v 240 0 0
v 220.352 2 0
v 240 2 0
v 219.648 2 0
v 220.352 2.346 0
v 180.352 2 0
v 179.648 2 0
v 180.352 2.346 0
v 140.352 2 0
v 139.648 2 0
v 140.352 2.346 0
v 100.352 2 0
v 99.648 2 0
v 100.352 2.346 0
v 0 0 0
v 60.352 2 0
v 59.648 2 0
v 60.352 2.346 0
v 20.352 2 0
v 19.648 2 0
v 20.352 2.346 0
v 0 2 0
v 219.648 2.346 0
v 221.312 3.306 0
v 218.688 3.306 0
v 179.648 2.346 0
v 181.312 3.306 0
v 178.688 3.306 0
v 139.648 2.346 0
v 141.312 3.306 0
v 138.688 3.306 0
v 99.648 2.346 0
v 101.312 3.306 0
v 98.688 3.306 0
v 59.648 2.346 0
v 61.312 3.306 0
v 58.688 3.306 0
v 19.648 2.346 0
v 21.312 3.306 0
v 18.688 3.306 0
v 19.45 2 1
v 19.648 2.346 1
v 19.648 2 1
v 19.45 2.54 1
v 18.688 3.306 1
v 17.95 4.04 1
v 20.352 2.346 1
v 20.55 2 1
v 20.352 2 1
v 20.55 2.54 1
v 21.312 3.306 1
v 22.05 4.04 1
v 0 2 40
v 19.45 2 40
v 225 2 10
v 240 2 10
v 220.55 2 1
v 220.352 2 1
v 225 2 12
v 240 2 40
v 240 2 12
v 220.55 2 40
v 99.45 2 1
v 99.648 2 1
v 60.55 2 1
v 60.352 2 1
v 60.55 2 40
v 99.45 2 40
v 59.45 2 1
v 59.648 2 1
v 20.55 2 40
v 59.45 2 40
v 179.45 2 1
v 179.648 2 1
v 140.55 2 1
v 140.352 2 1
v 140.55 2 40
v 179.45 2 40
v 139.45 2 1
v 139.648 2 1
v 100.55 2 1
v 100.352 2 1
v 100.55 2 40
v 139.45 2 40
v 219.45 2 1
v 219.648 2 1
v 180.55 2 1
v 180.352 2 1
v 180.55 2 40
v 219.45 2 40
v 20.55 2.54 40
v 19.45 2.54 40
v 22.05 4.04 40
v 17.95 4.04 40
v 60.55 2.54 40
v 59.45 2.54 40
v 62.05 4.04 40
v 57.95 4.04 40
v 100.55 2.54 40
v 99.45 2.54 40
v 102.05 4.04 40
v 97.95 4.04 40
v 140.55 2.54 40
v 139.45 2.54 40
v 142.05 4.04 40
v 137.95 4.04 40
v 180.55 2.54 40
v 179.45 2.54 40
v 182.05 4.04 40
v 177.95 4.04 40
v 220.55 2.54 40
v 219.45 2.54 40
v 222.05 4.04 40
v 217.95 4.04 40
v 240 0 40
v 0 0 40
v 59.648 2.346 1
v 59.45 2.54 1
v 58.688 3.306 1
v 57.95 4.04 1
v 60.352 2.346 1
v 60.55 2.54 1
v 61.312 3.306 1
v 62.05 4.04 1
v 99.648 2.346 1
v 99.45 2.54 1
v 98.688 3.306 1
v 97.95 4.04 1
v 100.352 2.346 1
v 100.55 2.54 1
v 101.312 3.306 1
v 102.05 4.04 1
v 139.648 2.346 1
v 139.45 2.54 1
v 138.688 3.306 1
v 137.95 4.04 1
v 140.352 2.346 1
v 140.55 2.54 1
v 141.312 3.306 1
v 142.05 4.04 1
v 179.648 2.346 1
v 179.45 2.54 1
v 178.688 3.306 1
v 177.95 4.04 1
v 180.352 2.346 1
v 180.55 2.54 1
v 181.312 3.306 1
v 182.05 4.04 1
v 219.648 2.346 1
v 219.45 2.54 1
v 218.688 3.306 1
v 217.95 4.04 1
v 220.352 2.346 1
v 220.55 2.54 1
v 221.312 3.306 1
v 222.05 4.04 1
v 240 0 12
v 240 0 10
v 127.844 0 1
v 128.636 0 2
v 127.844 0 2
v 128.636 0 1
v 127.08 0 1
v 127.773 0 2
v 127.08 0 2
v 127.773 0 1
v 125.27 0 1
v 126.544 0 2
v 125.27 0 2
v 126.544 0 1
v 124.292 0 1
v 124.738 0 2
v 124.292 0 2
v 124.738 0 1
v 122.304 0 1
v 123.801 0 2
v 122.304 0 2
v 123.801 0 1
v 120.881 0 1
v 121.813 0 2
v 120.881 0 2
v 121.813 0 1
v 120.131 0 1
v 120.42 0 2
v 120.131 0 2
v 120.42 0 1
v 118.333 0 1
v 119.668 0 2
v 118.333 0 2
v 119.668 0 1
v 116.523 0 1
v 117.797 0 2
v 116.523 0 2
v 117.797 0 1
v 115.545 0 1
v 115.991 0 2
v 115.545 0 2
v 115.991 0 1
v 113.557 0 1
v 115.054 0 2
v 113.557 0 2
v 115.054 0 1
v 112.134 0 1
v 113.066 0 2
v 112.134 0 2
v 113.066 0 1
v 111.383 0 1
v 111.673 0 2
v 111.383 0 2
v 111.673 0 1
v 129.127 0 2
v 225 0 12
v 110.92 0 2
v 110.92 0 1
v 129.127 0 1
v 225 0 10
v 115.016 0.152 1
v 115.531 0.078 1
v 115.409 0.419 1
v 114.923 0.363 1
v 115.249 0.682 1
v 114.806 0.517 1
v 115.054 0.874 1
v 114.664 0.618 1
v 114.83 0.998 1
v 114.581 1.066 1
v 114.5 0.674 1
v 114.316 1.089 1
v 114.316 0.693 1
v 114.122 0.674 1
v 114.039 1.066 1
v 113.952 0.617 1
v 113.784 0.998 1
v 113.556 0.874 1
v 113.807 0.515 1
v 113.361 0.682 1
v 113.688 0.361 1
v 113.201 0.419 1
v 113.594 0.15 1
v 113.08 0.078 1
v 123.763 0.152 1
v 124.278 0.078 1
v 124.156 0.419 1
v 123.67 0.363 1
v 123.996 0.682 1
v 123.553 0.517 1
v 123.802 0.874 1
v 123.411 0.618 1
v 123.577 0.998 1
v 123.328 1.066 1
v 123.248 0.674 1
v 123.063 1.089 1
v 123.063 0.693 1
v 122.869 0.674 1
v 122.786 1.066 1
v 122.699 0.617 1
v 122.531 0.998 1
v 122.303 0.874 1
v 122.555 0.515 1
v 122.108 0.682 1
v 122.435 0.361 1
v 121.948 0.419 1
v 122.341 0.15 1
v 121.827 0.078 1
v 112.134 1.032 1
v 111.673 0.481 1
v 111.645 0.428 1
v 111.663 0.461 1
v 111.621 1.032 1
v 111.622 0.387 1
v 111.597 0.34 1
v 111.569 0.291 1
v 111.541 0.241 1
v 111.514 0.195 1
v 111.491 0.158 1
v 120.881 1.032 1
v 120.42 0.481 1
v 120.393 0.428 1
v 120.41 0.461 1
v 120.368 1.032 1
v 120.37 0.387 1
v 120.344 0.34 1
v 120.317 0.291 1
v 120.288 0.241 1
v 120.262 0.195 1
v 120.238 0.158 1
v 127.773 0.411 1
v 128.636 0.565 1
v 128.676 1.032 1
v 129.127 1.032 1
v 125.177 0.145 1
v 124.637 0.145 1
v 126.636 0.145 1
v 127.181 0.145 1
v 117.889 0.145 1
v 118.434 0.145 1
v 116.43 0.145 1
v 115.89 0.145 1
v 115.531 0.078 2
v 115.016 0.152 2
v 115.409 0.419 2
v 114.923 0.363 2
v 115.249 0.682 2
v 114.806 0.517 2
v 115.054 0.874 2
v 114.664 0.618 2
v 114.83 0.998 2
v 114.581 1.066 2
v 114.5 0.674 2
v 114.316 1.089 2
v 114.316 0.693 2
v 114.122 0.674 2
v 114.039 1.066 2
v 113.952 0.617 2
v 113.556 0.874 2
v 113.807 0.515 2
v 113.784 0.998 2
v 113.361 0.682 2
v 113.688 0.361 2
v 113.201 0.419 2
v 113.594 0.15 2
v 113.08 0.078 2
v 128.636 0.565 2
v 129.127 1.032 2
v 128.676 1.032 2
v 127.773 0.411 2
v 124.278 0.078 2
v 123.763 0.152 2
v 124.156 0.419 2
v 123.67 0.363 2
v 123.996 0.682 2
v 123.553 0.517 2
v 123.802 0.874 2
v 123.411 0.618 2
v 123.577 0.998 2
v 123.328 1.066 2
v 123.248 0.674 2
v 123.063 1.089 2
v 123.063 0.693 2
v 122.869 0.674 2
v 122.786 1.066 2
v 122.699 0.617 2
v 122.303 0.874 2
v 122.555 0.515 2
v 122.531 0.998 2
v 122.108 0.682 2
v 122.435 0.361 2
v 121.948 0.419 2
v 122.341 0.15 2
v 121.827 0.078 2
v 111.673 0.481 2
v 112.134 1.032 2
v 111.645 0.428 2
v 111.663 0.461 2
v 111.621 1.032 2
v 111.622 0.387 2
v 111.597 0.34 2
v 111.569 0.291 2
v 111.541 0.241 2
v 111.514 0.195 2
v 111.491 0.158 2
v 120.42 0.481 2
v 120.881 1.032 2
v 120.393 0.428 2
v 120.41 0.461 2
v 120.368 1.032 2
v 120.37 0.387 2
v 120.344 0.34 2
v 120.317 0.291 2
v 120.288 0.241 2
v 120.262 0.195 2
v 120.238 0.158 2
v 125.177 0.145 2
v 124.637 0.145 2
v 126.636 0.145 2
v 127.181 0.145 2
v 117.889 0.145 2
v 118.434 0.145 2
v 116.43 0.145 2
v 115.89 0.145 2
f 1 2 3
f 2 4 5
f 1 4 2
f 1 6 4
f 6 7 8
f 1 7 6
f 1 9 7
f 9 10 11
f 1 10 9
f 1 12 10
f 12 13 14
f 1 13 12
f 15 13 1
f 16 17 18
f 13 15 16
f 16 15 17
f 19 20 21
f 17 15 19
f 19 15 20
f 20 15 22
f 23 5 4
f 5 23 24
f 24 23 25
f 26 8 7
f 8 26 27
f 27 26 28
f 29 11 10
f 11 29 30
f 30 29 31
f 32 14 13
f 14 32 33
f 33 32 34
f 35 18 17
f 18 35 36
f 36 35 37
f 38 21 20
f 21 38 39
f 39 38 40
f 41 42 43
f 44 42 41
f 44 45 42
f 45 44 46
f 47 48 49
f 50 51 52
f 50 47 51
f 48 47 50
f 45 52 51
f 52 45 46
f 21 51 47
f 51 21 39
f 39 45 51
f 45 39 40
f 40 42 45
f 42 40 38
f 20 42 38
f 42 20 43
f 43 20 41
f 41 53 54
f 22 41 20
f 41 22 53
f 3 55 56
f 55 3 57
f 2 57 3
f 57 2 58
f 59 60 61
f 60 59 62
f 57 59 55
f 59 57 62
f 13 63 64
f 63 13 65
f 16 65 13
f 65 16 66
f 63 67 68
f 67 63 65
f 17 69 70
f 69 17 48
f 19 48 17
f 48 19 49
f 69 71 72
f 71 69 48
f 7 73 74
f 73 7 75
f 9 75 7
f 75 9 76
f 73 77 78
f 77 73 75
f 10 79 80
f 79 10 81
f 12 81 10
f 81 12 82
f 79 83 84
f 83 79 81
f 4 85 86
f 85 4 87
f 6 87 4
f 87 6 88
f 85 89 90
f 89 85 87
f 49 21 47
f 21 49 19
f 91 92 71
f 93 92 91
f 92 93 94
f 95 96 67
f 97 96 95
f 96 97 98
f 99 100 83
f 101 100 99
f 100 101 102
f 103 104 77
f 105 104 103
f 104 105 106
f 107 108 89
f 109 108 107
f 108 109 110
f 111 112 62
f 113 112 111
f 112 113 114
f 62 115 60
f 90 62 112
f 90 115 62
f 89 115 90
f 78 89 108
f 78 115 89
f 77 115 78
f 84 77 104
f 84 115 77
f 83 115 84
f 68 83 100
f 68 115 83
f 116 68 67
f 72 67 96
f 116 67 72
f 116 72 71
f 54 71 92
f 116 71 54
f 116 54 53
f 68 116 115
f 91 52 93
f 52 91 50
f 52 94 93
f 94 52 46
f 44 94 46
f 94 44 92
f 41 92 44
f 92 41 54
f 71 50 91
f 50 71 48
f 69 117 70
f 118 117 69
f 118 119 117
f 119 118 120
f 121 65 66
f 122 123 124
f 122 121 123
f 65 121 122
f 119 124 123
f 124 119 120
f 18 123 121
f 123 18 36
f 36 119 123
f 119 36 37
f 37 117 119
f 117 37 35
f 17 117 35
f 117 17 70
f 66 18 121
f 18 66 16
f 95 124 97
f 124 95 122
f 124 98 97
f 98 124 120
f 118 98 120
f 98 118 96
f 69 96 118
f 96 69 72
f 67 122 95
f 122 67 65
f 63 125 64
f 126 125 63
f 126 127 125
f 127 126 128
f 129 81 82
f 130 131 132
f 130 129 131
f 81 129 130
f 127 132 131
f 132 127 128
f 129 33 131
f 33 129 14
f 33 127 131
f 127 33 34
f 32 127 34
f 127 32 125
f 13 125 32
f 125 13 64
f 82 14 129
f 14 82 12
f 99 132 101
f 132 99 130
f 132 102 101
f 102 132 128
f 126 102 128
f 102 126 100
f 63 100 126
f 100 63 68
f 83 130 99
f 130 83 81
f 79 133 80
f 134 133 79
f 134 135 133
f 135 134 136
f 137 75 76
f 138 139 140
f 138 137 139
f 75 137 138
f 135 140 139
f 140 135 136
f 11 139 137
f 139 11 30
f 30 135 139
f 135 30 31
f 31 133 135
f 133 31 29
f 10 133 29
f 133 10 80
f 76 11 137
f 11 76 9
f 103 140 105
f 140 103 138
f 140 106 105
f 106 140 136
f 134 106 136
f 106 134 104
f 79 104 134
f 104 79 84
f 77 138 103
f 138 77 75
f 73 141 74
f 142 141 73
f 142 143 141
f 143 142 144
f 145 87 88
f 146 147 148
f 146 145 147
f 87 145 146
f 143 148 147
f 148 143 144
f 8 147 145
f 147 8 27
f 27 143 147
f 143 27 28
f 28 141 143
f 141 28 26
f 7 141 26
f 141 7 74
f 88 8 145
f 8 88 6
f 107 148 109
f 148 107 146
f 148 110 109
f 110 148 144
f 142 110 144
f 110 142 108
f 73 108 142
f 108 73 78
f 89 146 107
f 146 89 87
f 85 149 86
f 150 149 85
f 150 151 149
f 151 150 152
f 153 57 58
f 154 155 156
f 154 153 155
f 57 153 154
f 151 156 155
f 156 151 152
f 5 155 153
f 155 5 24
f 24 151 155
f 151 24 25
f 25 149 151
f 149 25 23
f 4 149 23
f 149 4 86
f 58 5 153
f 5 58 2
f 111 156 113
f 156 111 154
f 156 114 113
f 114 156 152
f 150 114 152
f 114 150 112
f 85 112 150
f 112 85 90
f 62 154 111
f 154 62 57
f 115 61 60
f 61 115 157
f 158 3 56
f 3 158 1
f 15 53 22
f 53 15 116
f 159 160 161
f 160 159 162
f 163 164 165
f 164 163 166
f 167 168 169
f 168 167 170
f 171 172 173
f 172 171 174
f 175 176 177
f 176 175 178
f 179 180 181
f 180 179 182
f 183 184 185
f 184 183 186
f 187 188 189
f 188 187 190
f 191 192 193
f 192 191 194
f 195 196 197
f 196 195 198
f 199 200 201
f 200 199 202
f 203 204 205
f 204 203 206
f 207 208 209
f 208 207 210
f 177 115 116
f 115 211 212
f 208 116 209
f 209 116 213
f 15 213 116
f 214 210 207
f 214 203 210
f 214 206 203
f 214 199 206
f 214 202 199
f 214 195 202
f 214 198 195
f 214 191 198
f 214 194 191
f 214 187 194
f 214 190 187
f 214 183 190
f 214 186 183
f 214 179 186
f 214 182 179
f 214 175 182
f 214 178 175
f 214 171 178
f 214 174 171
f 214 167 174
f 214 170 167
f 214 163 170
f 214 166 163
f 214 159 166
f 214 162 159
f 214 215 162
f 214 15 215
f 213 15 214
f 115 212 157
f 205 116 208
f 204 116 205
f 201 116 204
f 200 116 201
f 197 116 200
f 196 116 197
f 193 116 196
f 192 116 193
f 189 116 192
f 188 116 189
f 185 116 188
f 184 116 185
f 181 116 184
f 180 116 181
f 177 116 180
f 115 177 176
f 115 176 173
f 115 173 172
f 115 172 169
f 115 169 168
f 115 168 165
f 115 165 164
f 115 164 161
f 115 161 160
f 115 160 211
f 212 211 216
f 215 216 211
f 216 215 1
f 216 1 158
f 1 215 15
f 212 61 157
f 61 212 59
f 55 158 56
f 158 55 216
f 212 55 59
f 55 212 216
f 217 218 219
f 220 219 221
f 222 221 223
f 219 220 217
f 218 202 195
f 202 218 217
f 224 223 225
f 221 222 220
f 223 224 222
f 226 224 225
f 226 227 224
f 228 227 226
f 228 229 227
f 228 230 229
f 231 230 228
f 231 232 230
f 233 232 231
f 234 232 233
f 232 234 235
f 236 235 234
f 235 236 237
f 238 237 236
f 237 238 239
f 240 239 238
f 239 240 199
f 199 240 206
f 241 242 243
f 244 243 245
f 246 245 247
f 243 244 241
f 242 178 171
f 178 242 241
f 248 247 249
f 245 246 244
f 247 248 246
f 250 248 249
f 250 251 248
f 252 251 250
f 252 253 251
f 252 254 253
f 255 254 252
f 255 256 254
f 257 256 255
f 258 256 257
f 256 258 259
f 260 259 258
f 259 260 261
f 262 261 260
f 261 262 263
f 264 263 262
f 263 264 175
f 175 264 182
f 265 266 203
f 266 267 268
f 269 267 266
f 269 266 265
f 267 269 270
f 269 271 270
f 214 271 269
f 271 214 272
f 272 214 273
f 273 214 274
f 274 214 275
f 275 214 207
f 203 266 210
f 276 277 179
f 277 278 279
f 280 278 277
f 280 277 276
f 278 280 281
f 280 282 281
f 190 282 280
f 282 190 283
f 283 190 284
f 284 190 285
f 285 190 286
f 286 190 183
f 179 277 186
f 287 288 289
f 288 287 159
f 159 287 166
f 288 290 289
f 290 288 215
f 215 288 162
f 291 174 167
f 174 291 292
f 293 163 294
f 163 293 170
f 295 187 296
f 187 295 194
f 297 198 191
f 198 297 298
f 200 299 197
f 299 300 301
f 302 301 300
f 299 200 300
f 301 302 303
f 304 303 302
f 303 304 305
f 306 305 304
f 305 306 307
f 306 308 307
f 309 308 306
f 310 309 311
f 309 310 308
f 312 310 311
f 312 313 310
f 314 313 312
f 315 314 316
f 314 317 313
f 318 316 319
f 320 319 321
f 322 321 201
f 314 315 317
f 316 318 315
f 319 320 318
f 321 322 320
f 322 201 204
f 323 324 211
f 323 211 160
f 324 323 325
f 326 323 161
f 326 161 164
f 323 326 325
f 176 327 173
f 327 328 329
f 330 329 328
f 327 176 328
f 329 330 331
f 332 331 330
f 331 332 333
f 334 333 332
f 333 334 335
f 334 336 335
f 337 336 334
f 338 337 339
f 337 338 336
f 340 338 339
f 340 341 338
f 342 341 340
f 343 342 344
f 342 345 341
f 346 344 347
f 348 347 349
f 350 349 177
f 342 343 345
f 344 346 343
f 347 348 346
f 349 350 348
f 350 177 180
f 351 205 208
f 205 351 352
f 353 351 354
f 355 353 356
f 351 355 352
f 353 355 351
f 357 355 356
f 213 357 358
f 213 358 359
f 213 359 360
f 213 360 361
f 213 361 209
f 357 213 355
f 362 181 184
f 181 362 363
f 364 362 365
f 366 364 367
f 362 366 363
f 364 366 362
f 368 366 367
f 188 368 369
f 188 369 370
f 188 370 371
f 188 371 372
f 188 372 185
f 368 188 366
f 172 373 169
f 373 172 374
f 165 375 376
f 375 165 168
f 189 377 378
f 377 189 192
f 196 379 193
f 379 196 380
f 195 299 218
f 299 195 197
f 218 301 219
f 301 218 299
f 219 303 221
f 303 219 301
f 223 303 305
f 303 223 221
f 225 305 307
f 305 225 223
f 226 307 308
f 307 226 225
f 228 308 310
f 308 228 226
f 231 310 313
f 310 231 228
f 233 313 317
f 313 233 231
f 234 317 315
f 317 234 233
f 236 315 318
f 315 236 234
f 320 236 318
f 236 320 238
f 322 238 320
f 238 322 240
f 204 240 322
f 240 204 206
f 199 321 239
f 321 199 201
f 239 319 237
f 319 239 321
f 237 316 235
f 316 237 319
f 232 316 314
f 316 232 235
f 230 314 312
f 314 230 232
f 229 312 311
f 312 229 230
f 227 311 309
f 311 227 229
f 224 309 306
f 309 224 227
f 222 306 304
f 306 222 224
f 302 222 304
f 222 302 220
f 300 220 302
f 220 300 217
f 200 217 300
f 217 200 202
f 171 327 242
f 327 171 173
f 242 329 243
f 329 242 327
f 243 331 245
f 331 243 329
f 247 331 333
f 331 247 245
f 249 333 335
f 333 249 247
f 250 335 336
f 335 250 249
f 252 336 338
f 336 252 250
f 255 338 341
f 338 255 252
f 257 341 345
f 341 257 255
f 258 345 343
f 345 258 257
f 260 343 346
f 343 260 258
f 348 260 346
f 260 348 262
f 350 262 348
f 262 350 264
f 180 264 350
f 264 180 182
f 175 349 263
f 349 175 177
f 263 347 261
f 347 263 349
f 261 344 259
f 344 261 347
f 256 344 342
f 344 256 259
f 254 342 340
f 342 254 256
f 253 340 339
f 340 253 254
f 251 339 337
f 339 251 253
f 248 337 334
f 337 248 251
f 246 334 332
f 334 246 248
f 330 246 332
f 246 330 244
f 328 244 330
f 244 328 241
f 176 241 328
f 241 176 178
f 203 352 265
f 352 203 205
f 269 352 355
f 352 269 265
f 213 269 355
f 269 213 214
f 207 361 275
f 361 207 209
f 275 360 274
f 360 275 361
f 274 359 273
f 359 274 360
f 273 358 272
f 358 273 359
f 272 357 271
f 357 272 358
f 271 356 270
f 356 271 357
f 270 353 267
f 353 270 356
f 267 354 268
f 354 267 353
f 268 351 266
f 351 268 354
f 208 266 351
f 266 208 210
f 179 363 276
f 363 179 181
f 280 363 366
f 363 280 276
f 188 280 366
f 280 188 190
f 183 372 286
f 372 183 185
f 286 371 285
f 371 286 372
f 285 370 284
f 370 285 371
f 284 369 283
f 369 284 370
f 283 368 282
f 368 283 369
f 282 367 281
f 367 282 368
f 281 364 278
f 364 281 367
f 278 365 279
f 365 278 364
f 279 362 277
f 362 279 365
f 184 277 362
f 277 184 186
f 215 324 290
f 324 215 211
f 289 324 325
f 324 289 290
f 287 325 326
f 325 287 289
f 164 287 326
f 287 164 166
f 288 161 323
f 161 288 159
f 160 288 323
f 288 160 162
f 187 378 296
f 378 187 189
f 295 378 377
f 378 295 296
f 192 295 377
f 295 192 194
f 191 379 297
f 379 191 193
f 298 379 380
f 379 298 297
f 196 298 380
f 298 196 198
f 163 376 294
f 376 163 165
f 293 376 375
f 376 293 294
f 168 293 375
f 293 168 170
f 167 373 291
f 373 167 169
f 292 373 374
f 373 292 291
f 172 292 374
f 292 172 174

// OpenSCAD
echo(version=version(4.0));
//comments: Version 2 adds anti-"elephant foot" scaling at bottom of dovetail sections
//comments: Version 3 added rounded bottom, dovetail suppression, and ability to render a 0 box units width
//comments: Version 4 added notation to the bottom that records dovetail size and box size
//comments: Version 5 added card slot feature for inserting labels or cards
/* [Size] */
//Box unit size in mm. This defines the size of 1 'unit' for your box.
BoxUnits = 40;
//Box Height in mm
BoxHeight = 40;
//Box Wall Thickness in mm
BoxWall = 1;
//Box Floor Thickness in mm
BoxFloor = 2;
//Box Width in units
BoxWidthUnits = 0;
BoxWidth = (BoxWidthUnits>0) ? BoxWidthUnits * BoxUnits : BoxWall*2;


//Box Length in units
BoxLengthUnits = 6;
BoxLength = BoxLengthUnits * BoxUnits;


//Fit Factor. Greater factor = looser fit
FitFactor = 0.18;  // [0:0.01:0.4]
RoundedBottom = "EW"; // [N:None, EW:East-West, NS:North-South]

/* [Walls] */
//North Wall open or closed
NorthWallOpen = 0; // [0:Closed, 1:Open]
//South Wall open or closed
SouthWallOpen = 0; // [0:Closed, 1:Open]

/* [Dovetail] */
//Set True to suppress female dovetails
SuppressFemaleDT = 1; // [1:True, 0:False]
//Set True to suppress male dovetails
SuppressMaleDT = 0; // [1:True, 0:False]
//Dovetail inside length in mm
DTInsideLength = 1.1;
//Dovetail angle in degrees
DTAngle = 45;
//Dovetail width in mm
DTWidth = 1.5;

/* [Card Slot] */
//Enable card slot for label or identification
EnableCardSlot = true; // [true:Enabled, false:Disabled]
//Width of the card to insert (mm)
CardWidth = 30;
//Height of the card slot (mm)
CardSlotHeight = 2;
//Depth of the card slot (how far it extends into the box) (mm)
CardSlotDepth = 15;
//Clearance for the card (makes the slot slightly larger) (mm)
CardClearance = 0.5;
//Vertical position of the card slot from bottom (mm)
CardSlotYPos = 10;
//Which side to place the card slot (0=None, 1=South, 2=North, 3=Both)
CardSlotSide = 1; // [0:None, 1:South, 2:North, 3:Both]

/* [Hidden] */
//This helps calculate the length of the 'long' side of the dovetail
DTx=tan(DTAngle)*DTWidth;
//This polygon defines the dovetail shape
DTShape = [[0,0],[DTInsideLength/2,0],[DTInsideLength/2+DTx,DTWidth],[-DTInsideLength/2-DTx,DTWidth],[-DTInsideLength/2,0]];

// Small value for ensuring proper differences and unions
epsilon = 0.01;

//build text for bottom
DTTxt=str("DT:",DTWidth,"x",DTInsideLength);
SizeTxt=str(BoxUnits,"x",BoxHeight,"x",BoxWall);

//this section defines a module for creating a "rounded" bottom to the box, useful when storing small parts
module RoundBottom(width, length, height){    
    translate([0,length,0])rotate([90,0,0])
    linear_extrude(length, center=false)
    
    difference() {
        translate([-width/2,0,0])square([width,height/2],center=false);
        translate([0,height/2,0])resize([width,height]) circle(d=width*10);
    }
}



union(){
    //creates and transforms rounded bottom
    if (RoundedBottom=="EW") {
    translate([0,(BoxWidth/2)+BoxWall,BoxFloor])
    rotate([0,0,-90])
    RoundBottom(BoxWidth-DTWidth-(BoxWall),BoxLength-DTWidth-BoxWall,2*(BoxHeight-BoxFloor));
    }

    //creates rounded bottom oriented North-South
    if (RoundedBottom=="NS") {
    translate([(BoxLength/2)-BoxWall,DTWidth+BoxWall/2,BoxFloor])
    rotate([0,0,0])
    RoundBottom(BoxLength-DTWidth-(BoxWall),BoxWidth-DTWidth-BoxWall,2*(BoxHeight-BoxFloor));
    }

    //Creates main box,without round bottom
    difference(){
        
    union(){
        //main box
    cube([BoxLength,BoxWidth,BoxHeight], center=false);

        //male dovetails
    if (!SuppressMaleDT) {    
    for (i=[1:BoxLengthUnits])
    translate([(i-1)*BoxUnits+(BoxUnits/2),BoxWidth,0])
        //in 2 sections. first section is slightly scaled down to counter "elephant foot"
        union(){
            linear_extrude(height=1, center=false)
                scale([1-(2*FitFactor),1-(2*FitFactor),1])
                union(){        
                    //this adds a slight offset to the male dovetail for a looser fit
                    translate([-DTInsideLength/2,0,0])
                    square([DTInsideLength,DTWidth]);
                    //main dovetail shape
                    translate([0,DTWidth*FitFactor*2,0])
                    polygon(DTShape);
                };
            translate([0,0,1])
            linear_extrude(height=BoxHeight-1, center=false)
                    union(){
                    //this adds a slight offset to the male dovetail for a looser fit
                    translate([-DTInsideLength/2,0,0])
                    square([DTInsideLength,DTWidth]);
                    //main dovetail shape
                    translate([0,DTWidth*FitFactor*2,0])
                    polygon(DTShape);
                    };
        }        
    }
    if ((BoxWidthUnits>0)&&(!SuppressMaleDT) ) {
        for (i=[1:BoxWidthUnits]) {
            translate([0,(i-1)*BoxUnits+(BoxUnits/2),0])
                //in 2 sections. first section is slightly scaled down to counter "elephant foot"
                rotate([0,0,90])
                union(){
                    linear_extrude(height=1, center=false)				//1mm high anti-elephant foot section
                        scale([1-(2*FitFactor),1-(2*FitFactor),1])
                        union(){        
                            //this adds a slight offset to the male dovetail for a looser fit
                            translate([-DTInsideLength/2,0,0])
                            square([DTInsideLength,DTWidth]);
                            //main dovetail shape
                            translate([0,DTWidth*FitFactor*2,0])
                            polygon(DTShape);
                        };
                    translate([0,0,1])
                    linear_extrude(height=BoxHeight-1, center=false)
                        union(){
                            //male dovetail offset
                            translate([-DTInsideLength/2,0,0])
                            square([DTInsideLength,DTWidth]);
                            //main dovetail shape
                            translate([0,DTWidth*FitFactor*2,0])
                            polygon(DTShape);
                        };
                }
        }
    }
    }
    //female dovetails
    if (!SuppressFemaleDT) {
    for (i=[1:BoxLengthUnits])
        union(){
            translate([(i-1)*BoxUnits+(BoxUnits/2),0,0])
                scale([1+FitFactor,1+FitFactor,1])
                linear_extrude(height=BoxHeight, center=false)
                polygon(DTShape);
        
            //added a second dovetail cutout at the bottom, scaled up to counter "elephant foot" when printed
            translate([(i-1)*BoxUnits+(BoxUnits/2),0,0])
                scale([1+(3*FitFactor),1+(3*FitFactor),1])
                linear_extrude(height=1, center=false)
                polygon(DTShape);					
        }

    for (i=[1:BoxWidthUnits])
        union(){
            translate([BoxLength,(i-1)*BoxUnits+(BoxUnits/2),0])
                rotate([0,0,90])
                    scale([1+FitFactor,1+FitFactor,1])
                        linear_extrude(height=BoxHeight, center=false)
                            polygon(DTShape);
            //added a second dovetail cutout at the bottom, scaled up to counter "elephant foot" when printed
            translate([BoxLength,(i-1)*BoxUnits+(BoxUnits/2),0])
                rotate([0,0,90])
                    scale([1+(3*FitFactor),1+(3*FitFactor),1])
                        linear_extrude(height=1, center=false)
                            polygon(DTShape);	
        }
    }
    //carves out main box
    translate([BoxWall,DTWidth+BoxWall,BoxFloor])
        cube([BoxLength-(2*BoxWall)-DTWidth, (BoxWidth-(2*BoxWall)-DTWidth), BoxHeight]);

    if (NorthWallOpen)
        translate([-DTWidth*(1+FitFactor+FitFactor),BoxWall+DTWidth,BoxFloor], center=false)
            cube([BoxWall+(DTWidth*(1+FitFactor+FitFactor)), (BoxWidth-(2*BoxWall)-DTWidth), BoxHeight]);    

    if (SouthWallOpen)
        translate([BoxLength-(BoxWall)-DTWidth,BoxWall+DTWidth,BoxFloor], center=false)
            cube([BoxWall+DTWidth, (BoxWidth-(2*BoxWall)-DTWidth), BoxHeight]);
            
    // Add card slot on South wall (if enabled)
    if (EnableCardSlot && (CardSlotSide == 1 || CardSlotSide == 3)) {
        // Card slot on South wall
        translate([
            BoxLength,  // South face
            (BoxWidth - CardWidth) / 2,  // Center horizontally
            CardSlotYPos  // Vertical position
        ])
            cube([
                BoxWall + epsilon,  // Cut through side wall
                CardWidth + CardClearance * 2,  // Width of slot
                CardSlotHeight  // Height of slot
            ]);
            
        // Horizontal card channel inside
        translate([
            BoxLength - CardSlotDepth,  // Extend inward from South face
            (BoxWidth - CardWidth) / 2,  // Center horizontally
            CardSlotYPos  // Same vertical position
        ])
            cube([
                CardSlotDepth,  // How deep the channel goes
                CardWidth + CardClearance * 2,  // Same width as slot
                CardSlotHeight  // Same height as slot
            ]);
    }
    
    // Add card slot on North wall (if enabled)
    if (EnableCardSlot && (CardSlotSide == 2 || CardSlotSide == 3)) {
        // Card slot on North wall
        translate([
            -BoxWall,  // North face
            (BoxWidth - CardWidth) / 2,  // Center horizontally
            CardSlotYPos  // Vertical position
        ])
            cube([
                BoxWall + epsilon,  // Cut through side wall
                CardWidth + CardClearance * 2,  // Width of slot
                CardSlotHeight  // Height of slot
            ]);
            
        // Horizontal card channel inside
        translate([
            0,  // At North face
            (BoxWidth - CardWidth) / 2,  // Center horizontally
            CardSlotYPos  // Same vertical position
        ])
            cube([
                CardSlotDepth,  // How deep the channel goes
                CardWidth + CardClearance * 2,  // Same width as slot
                CardSlotHeight  // Same height as slot
            ]);
    }

    //adds info text to bottom
    translate([BoxLength/2,(BoxWidth/2)+1,1]) rotate([0,0,0]) linear_extrude(1) text(DTTxt, halign="center", valign="bottom", size=4);
    translate([BoxLength/2,BoxWidth/2,1]) rotate([0,0,0]) linear_extrude(1) text(SizeTxt, halign="center", valign="top", size=4);
    }

    //
    }

// Uncomment to show an example card in the slot
/*
// Example card to show in the slot
if (EnableCardSlot && (CardSlotSide == 1 || CardSlotSide == 3)) {
    color("LightBlue", 0.7)
    translate([
        BoxLength - CardSlotDepth/2, 
        BoxWidth/2, 
        CardSlotYPos + CardSlotHeight/2
    ])
        cube([CardSlotDepth * 0.8, CardWidth * 0.9, 0.5], center=true);
}
*/
